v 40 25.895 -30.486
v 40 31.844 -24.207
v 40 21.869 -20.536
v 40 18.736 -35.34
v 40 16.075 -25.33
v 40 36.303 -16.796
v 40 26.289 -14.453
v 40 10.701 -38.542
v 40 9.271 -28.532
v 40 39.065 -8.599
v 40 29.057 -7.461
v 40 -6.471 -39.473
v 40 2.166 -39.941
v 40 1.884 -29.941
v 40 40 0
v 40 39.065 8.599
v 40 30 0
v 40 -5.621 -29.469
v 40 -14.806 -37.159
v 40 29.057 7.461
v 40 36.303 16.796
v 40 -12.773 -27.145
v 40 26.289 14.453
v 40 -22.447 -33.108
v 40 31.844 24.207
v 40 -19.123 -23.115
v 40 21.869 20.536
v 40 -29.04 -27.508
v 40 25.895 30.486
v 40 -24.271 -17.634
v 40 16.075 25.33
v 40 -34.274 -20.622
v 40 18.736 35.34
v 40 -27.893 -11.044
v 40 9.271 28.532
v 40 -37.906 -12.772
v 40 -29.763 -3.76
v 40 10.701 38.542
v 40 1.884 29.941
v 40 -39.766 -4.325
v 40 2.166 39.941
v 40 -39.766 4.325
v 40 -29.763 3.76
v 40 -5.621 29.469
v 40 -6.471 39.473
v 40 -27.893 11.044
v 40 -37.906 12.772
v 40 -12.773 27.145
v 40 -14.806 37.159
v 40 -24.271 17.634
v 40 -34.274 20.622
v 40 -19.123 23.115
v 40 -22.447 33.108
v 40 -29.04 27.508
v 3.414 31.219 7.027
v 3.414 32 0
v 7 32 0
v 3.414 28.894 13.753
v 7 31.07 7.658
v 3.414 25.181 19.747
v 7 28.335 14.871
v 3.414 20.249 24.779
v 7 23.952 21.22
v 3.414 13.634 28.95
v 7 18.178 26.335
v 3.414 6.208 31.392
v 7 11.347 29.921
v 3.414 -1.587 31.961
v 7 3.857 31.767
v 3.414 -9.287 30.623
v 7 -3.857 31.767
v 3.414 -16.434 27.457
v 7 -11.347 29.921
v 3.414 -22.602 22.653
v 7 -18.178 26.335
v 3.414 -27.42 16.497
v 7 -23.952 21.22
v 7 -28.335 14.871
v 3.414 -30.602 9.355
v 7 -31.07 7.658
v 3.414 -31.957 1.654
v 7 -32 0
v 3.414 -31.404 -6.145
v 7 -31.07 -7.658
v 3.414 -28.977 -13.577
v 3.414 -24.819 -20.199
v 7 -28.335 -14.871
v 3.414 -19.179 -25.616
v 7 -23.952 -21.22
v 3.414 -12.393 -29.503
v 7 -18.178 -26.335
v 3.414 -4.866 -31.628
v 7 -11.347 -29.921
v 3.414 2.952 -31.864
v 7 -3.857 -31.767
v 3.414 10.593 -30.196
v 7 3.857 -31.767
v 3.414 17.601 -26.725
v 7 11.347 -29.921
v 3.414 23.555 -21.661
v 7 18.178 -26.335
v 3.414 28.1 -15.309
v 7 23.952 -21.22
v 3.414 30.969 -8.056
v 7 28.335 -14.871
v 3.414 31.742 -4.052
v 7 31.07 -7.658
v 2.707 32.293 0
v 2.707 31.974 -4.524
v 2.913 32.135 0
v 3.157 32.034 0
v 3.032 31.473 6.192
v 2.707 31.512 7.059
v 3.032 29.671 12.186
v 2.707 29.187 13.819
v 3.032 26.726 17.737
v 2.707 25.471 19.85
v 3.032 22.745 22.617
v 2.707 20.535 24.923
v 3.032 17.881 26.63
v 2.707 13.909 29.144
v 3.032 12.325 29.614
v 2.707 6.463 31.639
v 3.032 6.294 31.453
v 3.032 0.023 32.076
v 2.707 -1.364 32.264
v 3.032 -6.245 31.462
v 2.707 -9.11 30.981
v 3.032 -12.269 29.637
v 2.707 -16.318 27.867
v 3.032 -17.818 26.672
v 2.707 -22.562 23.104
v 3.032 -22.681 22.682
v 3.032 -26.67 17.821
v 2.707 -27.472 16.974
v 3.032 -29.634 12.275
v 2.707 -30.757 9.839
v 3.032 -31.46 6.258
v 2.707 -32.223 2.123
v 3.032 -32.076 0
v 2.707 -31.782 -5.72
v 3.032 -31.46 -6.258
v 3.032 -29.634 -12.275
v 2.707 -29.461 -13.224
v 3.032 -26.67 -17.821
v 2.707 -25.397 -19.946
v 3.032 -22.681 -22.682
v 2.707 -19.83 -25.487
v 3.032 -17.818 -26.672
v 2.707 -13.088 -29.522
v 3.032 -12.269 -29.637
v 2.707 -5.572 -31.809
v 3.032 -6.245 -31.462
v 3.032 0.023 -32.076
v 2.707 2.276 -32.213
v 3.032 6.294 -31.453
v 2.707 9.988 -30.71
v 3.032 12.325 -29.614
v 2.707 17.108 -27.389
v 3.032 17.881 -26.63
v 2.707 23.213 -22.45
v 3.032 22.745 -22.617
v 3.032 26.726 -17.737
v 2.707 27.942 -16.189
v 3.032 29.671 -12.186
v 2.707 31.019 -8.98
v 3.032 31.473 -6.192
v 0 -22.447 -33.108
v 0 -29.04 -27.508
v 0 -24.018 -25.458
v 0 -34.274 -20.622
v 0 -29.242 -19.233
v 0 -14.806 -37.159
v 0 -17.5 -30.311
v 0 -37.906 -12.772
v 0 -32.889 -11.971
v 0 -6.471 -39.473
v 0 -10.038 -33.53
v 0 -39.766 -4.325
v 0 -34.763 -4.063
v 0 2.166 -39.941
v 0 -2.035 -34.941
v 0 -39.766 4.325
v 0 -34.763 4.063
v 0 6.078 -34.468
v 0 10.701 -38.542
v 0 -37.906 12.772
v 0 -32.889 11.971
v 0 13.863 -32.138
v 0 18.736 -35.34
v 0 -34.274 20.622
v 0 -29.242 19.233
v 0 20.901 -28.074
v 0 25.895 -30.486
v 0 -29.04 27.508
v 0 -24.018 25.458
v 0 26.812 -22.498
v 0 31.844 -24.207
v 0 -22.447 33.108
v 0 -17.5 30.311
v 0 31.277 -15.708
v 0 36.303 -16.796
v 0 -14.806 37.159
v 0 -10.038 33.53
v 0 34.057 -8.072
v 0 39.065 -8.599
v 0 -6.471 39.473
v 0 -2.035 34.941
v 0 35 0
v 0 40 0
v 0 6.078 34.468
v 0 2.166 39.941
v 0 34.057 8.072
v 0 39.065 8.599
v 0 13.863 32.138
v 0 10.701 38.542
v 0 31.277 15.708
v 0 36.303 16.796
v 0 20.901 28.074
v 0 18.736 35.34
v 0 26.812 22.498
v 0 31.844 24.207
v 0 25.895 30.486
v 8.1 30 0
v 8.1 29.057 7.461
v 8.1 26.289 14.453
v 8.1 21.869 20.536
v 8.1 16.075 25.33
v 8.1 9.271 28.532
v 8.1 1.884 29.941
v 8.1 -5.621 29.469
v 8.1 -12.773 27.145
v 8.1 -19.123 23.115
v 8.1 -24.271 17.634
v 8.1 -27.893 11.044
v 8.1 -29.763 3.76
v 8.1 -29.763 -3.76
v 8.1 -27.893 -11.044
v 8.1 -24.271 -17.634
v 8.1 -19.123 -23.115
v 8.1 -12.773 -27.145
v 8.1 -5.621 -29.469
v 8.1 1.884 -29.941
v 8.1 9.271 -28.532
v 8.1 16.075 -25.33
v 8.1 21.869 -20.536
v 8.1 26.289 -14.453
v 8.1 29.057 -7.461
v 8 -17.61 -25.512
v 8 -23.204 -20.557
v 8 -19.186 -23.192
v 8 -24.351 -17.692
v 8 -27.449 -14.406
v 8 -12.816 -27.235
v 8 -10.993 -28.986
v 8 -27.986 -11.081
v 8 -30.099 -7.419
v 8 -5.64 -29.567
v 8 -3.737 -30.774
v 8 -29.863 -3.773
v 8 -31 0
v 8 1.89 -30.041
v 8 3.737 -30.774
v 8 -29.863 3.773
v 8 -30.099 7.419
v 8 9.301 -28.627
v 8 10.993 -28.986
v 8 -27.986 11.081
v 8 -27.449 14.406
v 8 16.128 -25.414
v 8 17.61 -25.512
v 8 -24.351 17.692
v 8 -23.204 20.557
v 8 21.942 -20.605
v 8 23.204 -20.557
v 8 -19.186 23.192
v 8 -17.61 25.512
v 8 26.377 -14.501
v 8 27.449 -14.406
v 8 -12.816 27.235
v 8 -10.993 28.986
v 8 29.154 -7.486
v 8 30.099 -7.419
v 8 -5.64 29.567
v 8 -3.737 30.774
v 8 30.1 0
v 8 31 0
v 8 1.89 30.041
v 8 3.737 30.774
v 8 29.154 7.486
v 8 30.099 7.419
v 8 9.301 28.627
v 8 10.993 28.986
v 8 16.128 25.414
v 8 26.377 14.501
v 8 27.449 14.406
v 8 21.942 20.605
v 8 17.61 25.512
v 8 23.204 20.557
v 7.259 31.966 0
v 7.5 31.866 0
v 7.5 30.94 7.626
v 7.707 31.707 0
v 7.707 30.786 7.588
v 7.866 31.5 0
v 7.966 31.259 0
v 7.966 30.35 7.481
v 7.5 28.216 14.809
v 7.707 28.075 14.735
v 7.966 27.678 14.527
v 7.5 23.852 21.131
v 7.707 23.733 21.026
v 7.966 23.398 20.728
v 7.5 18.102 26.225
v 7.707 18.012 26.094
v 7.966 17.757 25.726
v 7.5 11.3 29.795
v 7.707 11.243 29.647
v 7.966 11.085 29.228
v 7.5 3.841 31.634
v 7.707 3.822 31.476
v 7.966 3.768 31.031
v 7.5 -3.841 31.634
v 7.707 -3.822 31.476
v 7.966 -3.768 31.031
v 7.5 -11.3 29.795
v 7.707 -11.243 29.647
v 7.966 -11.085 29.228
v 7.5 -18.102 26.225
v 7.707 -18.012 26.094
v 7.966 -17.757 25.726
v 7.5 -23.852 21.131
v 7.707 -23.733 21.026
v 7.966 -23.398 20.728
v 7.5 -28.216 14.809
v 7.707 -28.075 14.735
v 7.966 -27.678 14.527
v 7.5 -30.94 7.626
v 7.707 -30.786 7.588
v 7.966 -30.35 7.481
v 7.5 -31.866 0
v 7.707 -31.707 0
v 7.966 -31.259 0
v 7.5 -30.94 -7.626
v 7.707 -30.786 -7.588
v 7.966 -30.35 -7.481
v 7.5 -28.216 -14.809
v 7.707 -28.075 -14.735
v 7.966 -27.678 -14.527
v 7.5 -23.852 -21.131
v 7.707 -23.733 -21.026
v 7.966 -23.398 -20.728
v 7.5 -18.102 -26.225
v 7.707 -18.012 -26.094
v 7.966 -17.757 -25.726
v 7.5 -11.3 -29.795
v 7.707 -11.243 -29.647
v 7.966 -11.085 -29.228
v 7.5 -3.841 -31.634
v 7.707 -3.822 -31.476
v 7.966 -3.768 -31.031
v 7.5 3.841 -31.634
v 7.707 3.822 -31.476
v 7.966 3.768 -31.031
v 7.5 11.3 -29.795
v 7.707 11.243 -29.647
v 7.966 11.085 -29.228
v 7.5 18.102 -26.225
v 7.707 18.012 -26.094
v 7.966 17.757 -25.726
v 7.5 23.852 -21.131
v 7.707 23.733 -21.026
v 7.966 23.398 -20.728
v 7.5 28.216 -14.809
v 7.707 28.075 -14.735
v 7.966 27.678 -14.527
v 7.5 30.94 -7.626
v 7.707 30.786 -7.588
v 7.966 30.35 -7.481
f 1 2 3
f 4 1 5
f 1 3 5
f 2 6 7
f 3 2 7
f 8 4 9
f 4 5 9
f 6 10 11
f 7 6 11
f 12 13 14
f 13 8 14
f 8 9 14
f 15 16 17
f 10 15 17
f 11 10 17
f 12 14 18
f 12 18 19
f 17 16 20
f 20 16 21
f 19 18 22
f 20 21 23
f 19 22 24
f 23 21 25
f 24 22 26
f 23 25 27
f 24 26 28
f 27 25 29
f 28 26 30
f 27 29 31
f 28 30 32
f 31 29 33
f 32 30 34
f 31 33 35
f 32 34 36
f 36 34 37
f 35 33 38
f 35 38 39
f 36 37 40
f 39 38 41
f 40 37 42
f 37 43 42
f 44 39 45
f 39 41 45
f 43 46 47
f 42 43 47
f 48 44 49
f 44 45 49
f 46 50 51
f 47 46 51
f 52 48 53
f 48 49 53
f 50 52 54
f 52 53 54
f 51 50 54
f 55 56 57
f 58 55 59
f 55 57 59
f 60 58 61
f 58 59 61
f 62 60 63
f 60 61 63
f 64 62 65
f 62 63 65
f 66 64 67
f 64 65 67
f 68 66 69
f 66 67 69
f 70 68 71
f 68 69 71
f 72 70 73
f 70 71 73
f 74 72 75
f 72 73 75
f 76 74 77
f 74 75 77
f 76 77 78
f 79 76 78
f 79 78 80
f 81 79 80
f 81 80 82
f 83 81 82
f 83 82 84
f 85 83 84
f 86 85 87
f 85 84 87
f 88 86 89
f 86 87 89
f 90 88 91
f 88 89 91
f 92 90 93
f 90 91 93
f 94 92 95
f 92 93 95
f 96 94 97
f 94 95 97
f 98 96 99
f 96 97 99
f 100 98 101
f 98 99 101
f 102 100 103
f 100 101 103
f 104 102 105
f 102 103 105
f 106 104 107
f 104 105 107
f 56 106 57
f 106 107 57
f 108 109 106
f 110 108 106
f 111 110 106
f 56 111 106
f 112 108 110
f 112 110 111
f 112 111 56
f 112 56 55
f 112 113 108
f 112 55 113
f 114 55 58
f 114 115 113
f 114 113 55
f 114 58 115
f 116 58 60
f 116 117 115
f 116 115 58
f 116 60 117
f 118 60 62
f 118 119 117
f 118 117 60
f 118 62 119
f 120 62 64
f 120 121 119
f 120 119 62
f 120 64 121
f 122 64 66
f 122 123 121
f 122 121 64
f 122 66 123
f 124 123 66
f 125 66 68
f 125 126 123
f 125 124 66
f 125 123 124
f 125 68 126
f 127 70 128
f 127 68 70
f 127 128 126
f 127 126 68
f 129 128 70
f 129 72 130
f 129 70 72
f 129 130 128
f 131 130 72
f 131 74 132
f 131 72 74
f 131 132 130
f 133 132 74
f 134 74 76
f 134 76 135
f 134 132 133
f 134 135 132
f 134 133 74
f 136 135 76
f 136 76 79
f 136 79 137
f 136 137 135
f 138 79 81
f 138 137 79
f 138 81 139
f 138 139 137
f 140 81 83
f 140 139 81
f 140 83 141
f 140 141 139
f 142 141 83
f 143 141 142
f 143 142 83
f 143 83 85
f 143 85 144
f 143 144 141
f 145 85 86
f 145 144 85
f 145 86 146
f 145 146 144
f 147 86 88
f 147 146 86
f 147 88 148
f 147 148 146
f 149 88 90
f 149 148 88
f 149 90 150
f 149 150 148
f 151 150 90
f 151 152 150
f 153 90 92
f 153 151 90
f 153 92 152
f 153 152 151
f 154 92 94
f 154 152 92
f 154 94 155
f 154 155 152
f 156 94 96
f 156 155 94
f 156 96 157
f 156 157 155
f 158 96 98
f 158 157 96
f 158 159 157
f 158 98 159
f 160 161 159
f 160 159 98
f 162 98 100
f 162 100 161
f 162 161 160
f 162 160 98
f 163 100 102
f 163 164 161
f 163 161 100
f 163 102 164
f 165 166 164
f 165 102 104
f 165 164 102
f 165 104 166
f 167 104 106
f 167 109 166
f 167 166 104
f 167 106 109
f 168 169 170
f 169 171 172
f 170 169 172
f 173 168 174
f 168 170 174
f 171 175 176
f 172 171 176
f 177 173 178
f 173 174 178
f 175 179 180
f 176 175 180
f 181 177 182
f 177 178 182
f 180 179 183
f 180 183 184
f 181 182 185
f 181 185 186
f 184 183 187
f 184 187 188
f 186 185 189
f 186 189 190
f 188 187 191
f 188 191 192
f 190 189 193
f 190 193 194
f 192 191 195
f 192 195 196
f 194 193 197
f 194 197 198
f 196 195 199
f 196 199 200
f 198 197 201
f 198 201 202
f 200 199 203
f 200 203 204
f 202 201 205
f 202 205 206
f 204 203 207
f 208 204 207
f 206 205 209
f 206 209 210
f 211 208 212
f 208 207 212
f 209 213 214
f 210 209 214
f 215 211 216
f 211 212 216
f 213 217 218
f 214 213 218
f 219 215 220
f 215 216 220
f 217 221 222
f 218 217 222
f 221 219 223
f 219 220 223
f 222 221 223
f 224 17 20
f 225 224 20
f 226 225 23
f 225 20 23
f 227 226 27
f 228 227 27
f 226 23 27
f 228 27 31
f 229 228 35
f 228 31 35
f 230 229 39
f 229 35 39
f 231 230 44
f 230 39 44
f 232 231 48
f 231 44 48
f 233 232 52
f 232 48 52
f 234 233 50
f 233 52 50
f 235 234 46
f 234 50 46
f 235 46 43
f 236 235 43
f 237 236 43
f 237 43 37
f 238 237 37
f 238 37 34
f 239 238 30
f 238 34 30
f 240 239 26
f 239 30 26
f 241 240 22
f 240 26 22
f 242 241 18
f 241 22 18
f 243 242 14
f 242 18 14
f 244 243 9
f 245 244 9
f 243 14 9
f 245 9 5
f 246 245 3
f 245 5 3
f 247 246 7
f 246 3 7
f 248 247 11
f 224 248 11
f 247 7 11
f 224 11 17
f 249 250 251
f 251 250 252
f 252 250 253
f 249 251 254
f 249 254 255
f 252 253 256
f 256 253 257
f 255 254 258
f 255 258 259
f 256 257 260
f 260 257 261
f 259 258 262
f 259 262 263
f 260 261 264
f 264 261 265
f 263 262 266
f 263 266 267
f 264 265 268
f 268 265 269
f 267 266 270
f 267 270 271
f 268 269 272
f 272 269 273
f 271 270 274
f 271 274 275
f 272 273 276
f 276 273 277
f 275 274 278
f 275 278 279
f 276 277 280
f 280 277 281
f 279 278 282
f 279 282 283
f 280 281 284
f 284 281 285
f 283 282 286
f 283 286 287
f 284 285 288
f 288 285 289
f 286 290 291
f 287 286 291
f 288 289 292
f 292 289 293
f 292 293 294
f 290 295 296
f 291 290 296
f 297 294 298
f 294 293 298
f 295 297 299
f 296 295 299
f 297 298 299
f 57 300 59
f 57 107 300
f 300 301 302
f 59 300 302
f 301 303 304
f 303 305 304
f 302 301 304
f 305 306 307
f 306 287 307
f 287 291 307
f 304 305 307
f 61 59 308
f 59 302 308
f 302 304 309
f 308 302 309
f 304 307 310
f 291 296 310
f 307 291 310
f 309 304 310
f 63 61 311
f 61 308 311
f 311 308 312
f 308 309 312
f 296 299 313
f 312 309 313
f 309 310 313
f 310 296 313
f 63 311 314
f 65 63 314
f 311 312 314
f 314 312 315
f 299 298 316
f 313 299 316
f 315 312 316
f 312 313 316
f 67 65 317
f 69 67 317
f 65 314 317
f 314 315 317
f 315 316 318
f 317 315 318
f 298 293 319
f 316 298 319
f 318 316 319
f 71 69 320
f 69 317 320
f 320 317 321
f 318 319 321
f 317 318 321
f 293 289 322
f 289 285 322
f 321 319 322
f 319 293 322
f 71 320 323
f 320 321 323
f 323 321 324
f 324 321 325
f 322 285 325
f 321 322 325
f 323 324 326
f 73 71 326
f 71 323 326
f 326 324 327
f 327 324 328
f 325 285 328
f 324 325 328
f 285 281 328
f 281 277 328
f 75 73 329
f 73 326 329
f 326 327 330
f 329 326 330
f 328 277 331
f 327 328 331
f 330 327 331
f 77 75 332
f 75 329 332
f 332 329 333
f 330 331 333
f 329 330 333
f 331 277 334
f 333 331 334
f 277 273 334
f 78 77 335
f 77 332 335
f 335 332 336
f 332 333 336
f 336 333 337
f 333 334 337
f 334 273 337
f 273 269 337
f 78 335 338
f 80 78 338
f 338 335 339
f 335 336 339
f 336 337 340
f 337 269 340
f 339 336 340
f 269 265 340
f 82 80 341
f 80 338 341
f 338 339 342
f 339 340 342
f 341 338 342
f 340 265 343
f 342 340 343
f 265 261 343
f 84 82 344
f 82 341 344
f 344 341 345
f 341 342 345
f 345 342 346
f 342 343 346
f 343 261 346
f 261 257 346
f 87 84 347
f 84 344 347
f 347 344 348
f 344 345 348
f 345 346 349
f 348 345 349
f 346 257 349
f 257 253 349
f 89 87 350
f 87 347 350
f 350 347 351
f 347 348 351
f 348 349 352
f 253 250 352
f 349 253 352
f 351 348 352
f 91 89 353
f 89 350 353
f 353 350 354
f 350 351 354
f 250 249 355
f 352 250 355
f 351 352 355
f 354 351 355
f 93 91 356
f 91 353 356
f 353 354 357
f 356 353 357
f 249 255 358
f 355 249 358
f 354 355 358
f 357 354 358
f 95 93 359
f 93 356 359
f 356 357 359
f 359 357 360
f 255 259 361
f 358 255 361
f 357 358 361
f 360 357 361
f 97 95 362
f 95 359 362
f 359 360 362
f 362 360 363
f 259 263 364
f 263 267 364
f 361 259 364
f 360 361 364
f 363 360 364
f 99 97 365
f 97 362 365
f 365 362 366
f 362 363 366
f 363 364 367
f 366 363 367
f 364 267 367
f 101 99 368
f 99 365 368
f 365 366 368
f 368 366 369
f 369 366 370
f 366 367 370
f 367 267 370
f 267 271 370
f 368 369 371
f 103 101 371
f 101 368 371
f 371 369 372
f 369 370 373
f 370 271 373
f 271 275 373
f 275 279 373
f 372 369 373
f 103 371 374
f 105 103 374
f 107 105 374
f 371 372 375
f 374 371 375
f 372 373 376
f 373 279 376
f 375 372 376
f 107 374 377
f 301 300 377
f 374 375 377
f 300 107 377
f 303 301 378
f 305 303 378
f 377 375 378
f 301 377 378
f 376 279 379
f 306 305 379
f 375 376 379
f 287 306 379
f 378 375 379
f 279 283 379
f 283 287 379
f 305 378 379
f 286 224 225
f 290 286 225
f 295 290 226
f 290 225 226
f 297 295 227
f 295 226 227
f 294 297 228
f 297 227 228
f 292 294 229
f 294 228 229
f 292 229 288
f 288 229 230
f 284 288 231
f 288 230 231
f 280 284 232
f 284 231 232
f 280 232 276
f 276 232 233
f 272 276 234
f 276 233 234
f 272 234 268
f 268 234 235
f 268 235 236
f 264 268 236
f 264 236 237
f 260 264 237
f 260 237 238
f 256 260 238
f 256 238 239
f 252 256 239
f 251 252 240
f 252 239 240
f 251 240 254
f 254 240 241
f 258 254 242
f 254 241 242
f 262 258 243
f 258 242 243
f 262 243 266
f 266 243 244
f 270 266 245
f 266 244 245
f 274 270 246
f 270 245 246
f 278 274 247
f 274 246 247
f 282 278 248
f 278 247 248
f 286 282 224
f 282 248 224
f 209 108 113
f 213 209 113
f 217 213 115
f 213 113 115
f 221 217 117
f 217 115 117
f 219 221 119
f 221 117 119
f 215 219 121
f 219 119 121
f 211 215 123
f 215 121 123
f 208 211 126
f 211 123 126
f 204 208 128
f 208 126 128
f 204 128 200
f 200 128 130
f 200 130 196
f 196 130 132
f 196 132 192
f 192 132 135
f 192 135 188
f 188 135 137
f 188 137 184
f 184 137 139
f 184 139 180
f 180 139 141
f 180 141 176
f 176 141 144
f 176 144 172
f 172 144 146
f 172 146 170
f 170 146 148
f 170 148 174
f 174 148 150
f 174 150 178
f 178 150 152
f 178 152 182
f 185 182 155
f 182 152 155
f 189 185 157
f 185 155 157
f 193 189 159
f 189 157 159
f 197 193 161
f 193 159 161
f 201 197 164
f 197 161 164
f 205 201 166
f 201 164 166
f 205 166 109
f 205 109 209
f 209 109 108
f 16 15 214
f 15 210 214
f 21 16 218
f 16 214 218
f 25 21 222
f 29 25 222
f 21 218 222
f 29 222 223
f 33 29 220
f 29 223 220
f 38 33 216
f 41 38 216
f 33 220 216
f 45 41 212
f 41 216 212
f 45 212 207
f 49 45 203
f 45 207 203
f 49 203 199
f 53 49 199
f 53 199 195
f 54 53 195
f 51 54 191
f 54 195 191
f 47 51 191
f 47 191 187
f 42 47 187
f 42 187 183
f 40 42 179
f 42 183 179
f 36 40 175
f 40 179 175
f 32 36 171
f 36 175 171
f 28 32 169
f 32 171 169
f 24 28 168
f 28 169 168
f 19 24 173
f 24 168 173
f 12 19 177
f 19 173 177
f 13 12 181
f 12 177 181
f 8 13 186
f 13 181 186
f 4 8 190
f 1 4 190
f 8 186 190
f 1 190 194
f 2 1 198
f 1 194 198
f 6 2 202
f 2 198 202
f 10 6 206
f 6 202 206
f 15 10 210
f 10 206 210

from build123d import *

# Parameters (mm, degrees)
F2_SIZE = 3
F3_R    = 1
F4_SIZE = 0.1


with BuildPart() as f1:
    # F0 (on Top) → F1 (revolve)
    with BuildSketch(Plane.XY):
        Polygon((40, 40), (0, 40), (0, 32), (8, 32), (8, 30), (40, 30), align=None)
    revolve(axis=Axis((-2.474785153, 0, 0), (1, 0, 0)))

    # F2
    f2_edges = [f1.edges().sort_by_distance(p)[0] for p in [
        (0, -32, 0),
    ]]
    chamfer(f2_edges, length=F2_SIZE)

    # F3
    f3_edges = [f1.edges().sort_by_distance(p)[0] for p in [
        (8, -32, 0),
        (3, -32, 0),
    ]]
    fillet(f3_edges, radius=F3_R)

    # F4
    f4_edges = [f1.edges().sort_by_distance(p)[0] for p in [
        (8, -30, 0),
    ]]
    chamfer(f4_edges, length=F4_SIZE)


solid = f1.part
